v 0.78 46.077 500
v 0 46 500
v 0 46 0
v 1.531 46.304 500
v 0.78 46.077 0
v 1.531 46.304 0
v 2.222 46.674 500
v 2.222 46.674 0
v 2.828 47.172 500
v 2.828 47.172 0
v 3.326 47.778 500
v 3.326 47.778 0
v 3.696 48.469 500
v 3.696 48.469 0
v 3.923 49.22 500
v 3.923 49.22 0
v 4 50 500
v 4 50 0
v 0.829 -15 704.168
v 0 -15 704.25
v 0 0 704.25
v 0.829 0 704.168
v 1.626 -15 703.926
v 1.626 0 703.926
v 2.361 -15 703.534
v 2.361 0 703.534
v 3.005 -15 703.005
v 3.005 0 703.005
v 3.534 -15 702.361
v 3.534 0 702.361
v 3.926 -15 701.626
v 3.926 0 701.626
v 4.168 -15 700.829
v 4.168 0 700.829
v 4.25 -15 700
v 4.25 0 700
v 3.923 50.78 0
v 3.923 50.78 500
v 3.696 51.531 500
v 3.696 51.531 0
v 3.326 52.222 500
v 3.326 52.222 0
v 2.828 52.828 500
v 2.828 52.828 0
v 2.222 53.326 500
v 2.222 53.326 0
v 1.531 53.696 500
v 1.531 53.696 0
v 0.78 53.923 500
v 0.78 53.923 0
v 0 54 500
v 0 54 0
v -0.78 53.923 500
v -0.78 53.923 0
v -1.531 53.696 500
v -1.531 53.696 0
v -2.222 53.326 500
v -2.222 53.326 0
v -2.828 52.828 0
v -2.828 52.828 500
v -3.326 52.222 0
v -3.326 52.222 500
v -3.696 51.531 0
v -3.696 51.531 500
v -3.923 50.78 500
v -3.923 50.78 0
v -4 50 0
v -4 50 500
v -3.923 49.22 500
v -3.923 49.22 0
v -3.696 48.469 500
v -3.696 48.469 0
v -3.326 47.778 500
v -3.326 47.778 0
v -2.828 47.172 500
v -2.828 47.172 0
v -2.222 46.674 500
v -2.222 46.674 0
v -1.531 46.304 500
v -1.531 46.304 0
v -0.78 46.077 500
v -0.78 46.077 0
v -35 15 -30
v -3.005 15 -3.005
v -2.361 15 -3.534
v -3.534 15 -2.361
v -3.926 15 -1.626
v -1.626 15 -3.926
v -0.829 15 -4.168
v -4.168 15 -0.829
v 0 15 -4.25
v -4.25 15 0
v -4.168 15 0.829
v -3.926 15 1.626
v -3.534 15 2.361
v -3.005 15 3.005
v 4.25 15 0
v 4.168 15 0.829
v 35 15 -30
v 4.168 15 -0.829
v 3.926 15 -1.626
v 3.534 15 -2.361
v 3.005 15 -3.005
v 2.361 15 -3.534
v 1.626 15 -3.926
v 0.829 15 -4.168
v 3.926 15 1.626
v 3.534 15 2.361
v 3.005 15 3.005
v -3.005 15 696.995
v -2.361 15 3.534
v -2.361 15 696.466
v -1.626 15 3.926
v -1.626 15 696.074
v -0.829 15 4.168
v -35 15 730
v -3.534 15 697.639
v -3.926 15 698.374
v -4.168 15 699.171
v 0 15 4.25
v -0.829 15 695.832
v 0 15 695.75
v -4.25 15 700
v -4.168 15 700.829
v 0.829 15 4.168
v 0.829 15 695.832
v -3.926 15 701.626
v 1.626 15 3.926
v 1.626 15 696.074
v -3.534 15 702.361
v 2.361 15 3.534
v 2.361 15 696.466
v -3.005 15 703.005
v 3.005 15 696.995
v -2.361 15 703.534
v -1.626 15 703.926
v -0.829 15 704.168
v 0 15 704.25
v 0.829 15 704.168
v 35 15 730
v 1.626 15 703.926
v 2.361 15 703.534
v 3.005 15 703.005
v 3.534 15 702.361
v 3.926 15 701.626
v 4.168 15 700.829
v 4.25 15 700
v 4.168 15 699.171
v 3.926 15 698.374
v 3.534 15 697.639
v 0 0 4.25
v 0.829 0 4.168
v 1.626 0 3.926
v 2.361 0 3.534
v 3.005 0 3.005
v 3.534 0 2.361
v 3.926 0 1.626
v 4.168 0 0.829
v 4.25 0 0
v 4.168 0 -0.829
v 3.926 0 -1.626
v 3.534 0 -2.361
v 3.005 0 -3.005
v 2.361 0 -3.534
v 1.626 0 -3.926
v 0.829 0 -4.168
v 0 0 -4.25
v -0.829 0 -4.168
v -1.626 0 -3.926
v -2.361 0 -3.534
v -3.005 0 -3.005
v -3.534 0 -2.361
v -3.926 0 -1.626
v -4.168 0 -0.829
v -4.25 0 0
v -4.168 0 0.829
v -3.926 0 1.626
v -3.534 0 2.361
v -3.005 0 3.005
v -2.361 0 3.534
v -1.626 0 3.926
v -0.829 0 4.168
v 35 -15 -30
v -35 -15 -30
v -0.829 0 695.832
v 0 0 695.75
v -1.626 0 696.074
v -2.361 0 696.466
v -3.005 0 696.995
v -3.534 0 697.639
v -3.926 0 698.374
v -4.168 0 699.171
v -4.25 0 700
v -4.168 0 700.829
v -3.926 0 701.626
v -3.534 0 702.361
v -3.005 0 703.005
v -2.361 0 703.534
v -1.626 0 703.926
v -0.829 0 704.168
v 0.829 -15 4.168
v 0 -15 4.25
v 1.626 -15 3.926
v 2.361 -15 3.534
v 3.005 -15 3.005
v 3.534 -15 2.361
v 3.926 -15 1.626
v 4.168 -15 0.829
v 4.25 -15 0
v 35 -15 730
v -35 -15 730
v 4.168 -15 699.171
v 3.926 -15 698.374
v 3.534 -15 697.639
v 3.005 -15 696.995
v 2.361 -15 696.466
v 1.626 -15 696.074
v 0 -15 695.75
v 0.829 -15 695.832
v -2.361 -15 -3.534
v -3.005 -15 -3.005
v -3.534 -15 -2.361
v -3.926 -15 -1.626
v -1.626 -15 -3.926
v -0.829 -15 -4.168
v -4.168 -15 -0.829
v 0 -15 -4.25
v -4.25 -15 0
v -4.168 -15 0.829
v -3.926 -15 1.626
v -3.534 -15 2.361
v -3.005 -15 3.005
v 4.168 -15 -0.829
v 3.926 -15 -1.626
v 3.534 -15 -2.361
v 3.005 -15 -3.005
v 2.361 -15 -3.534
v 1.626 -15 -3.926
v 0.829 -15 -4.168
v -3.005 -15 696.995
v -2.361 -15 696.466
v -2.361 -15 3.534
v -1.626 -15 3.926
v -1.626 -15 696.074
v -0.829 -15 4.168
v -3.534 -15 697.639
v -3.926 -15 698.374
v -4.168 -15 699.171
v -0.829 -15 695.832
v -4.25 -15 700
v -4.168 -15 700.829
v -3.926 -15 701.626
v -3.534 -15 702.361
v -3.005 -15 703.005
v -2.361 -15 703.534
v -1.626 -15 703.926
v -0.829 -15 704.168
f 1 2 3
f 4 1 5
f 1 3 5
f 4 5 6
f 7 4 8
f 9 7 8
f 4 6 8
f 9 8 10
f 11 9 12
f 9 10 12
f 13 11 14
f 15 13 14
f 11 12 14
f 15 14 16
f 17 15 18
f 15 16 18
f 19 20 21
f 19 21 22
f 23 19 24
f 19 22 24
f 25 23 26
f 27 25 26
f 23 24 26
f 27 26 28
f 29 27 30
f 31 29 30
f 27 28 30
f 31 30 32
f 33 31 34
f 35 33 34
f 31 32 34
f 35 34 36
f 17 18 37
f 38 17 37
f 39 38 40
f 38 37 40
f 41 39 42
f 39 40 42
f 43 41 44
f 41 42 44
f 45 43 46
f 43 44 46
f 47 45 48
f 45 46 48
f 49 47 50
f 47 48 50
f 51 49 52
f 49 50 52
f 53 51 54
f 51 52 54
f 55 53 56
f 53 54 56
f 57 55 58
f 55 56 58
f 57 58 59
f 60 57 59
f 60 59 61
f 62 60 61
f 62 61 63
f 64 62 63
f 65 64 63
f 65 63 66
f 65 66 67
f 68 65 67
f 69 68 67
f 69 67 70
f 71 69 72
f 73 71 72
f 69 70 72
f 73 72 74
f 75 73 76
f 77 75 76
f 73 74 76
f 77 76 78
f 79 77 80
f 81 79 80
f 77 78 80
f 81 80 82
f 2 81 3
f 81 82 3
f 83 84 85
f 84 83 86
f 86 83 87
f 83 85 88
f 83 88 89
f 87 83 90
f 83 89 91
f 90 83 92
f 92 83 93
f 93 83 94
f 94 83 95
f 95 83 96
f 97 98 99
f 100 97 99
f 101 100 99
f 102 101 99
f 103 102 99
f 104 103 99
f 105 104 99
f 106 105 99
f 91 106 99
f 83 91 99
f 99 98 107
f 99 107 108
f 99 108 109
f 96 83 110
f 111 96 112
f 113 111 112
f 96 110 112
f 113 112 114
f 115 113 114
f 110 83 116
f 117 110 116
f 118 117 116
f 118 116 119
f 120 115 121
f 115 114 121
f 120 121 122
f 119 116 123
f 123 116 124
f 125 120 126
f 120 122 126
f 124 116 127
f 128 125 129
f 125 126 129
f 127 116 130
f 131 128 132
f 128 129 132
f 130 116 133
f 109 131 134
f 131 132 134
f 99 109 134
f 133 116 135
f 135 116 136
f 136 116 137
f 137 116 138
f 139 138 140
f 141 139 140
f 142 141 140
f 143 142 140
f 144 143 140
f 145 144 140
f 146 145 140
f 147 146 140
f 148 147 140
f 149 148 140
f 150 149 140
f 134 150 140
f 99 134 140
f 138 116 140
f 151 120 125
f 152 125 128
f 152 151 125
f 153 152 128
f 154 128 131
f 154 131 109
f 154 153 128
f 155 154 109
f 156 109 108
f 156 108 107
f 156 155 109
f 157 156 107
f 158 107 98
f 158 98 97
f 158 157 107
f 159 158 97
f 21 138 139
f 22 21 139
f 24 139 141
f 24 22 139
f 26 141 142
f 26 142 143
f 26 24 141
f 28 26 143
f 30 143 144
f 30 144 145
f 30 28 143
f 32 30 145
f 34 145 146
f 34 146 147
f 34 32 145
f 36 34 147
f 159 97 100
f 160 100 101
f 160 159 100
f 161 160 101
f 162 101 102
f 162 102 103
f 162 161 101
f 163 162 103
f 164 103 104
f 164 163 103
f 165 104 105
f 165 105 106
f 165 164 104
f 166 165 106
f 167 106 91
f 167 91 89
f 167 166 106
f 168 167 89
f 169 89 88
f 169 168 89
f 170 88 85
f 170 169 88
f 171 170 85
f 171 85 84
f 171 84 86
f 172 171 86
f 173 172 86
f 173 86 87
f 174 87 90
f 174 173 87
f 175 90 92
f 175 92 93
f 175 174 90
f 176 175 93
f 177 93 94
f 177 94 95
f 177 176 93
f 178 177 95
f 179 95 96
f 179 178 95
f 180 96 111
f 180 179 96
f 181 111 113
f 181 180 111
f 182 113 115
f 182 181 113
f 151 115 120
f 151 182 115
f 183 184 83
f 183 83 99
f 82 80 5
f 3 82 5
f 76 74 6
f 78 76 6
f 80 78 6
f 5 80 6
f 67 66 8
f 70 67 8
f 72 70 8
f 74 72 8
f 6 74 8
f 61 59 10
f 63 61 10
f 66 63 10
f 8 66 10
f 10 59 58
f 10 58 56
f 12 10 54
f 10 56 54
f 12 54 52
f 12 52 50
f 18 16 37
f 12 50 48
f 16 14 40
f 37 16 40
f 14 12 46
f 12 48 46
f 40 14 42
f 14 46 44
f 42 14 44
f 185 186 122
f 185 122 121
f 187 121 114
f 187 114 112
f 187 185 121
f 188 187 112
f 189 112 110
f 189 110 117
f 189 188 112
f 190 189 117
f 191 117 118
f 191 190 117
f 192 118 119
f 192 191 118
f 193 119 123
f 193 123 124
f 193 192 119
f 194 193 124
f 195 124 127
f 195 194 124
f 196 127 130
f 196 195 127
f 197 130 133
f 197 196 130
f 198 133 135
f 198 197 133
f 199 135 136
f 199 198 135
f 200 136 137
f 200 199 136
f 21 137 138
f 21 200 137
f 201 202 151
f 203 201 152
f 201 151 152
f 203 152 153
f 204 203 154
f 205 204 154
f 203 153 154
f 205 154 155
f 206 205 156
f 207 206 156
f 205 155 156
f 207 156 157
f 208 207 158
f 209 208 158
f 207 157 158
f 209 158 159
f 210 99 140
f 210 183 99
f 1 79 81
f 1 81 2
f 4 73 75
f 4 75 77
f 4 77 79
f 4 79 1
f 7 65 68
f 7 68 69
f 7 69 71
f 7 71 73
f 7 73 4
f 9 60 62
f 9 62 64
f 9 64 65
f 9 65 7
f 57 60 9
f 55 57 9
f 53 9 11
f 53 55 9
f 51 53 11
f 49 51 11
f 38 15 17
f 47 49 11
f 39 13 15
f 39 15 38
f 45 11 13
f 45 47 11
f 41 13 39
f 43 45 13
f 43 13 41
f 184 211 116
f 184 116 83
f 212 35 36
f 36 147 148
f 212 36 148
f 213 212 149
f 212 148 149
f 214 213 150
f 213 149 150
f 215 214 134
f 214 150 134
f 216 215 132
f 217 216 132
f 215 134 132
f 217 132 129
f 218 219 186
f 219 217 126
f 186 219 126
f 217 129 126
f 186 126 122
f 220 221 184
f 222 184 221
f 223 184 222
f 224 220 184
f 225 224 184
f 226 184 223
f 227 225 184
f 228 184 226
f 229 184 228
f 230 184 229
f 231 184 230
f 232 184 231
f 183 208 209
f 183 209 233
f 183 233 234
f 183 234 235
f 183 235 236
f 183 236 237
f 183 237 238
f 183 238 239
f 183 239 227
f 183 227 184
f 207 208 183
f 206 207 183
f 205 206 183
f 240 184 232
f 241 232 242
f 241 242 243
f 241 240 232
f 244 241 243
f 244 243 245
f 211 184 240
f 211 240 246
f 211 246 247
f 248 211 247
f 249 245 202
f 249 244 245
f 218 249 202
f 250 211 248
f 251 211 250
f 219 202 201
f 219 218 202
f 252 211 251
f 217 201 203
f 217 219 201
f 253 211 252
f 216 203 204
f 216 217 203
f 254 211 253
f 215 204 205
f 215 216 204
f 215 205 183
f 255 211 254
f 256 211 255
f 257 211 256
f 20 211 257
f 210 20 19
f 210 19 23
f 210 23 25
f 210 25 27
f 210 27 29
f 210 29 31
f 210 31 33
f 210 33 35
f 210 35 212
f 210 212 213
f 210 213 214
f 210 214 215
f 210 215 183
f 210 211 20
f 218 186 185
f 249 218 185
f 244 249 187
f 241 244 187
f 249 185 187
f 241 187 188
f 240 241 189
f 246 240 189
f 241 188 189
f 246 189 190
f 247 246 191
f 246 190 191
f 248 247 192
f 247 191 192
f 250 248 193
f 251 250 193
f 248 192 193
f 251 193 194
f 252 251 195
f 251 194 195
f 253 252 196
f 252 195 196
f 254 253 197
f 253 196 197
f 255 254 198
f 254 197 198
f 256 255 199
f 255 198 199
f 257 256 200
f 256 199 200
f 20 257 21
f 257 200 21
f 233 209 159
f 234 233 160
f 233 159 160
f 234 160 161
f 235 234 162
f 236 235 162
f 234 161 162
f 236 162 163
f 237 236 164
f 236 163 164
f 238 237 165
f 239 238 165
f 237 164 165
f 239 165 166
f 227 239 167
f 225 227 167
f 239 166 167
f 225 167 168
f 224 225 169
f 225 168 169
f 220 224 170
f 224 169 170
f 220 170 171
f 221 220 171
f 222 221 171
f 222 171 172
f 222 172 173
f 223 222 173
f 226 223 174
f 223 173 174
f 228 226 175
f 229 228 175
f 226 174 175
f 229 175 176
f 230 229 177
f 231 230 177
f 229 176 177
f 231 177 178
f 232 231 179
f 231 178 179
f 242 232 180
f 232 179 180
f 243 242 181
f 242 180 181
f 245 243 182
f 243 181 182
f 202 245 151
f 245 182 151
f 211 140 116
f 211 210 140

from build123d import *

# Parameters (mm, degrees)
F1_DEPTH = 15
F3_DEPTH = 500


with BuildPart() as f1:
    # F0 (on Front) → F1 (new body, symmetric)
    with BuildSketch(Plane.XZ):
        Polygon((35, 730), (0, 730), (-35, 730), (-35, 0), (-35, -30), (0, -30), (35, -30), (35, 0), align=None)
        with BuildLine():
            ThreePointArc((4.25, 0), (-3.00520382, -3.00520382), (0, 4.25))
            ThreePointArc((0, 4.25), (3.00520382, 3.00520382), (4.25, 0))
        make_face(mode=Mode.SUBTRACT)
        with BuildLine():
            ThreePointArc((4.25, 700), (3.00520382, 696.99479618), (0, 695.75))
            ThreePointArc((0, 695.75), (-4.25, 700), (0, 704.25))
            ThreePointArc((0, 704.25), (3.00520382, 703.00520382), (4.25, 700))
        make_face(mode=Mode.SUBTRACT)
    extrude(amount=F1_DEPTH, both=True)


with BuildPart() as f3:
    # F2 (on Top) → F3 (new body)
    with BuildSketch(Plane.XY):
        with BuildLine():
            ThreePointArc((0, 46), (2.8284271247, 47.1715728753), (4, 50))
            ThreePointArc((4, 50), (-2.8284271247, 52.8284271247), (0, 46))
        make_face()
    extrude(amount=F3_DEPTH)


solid = Compound([f1.part, f3.part])
